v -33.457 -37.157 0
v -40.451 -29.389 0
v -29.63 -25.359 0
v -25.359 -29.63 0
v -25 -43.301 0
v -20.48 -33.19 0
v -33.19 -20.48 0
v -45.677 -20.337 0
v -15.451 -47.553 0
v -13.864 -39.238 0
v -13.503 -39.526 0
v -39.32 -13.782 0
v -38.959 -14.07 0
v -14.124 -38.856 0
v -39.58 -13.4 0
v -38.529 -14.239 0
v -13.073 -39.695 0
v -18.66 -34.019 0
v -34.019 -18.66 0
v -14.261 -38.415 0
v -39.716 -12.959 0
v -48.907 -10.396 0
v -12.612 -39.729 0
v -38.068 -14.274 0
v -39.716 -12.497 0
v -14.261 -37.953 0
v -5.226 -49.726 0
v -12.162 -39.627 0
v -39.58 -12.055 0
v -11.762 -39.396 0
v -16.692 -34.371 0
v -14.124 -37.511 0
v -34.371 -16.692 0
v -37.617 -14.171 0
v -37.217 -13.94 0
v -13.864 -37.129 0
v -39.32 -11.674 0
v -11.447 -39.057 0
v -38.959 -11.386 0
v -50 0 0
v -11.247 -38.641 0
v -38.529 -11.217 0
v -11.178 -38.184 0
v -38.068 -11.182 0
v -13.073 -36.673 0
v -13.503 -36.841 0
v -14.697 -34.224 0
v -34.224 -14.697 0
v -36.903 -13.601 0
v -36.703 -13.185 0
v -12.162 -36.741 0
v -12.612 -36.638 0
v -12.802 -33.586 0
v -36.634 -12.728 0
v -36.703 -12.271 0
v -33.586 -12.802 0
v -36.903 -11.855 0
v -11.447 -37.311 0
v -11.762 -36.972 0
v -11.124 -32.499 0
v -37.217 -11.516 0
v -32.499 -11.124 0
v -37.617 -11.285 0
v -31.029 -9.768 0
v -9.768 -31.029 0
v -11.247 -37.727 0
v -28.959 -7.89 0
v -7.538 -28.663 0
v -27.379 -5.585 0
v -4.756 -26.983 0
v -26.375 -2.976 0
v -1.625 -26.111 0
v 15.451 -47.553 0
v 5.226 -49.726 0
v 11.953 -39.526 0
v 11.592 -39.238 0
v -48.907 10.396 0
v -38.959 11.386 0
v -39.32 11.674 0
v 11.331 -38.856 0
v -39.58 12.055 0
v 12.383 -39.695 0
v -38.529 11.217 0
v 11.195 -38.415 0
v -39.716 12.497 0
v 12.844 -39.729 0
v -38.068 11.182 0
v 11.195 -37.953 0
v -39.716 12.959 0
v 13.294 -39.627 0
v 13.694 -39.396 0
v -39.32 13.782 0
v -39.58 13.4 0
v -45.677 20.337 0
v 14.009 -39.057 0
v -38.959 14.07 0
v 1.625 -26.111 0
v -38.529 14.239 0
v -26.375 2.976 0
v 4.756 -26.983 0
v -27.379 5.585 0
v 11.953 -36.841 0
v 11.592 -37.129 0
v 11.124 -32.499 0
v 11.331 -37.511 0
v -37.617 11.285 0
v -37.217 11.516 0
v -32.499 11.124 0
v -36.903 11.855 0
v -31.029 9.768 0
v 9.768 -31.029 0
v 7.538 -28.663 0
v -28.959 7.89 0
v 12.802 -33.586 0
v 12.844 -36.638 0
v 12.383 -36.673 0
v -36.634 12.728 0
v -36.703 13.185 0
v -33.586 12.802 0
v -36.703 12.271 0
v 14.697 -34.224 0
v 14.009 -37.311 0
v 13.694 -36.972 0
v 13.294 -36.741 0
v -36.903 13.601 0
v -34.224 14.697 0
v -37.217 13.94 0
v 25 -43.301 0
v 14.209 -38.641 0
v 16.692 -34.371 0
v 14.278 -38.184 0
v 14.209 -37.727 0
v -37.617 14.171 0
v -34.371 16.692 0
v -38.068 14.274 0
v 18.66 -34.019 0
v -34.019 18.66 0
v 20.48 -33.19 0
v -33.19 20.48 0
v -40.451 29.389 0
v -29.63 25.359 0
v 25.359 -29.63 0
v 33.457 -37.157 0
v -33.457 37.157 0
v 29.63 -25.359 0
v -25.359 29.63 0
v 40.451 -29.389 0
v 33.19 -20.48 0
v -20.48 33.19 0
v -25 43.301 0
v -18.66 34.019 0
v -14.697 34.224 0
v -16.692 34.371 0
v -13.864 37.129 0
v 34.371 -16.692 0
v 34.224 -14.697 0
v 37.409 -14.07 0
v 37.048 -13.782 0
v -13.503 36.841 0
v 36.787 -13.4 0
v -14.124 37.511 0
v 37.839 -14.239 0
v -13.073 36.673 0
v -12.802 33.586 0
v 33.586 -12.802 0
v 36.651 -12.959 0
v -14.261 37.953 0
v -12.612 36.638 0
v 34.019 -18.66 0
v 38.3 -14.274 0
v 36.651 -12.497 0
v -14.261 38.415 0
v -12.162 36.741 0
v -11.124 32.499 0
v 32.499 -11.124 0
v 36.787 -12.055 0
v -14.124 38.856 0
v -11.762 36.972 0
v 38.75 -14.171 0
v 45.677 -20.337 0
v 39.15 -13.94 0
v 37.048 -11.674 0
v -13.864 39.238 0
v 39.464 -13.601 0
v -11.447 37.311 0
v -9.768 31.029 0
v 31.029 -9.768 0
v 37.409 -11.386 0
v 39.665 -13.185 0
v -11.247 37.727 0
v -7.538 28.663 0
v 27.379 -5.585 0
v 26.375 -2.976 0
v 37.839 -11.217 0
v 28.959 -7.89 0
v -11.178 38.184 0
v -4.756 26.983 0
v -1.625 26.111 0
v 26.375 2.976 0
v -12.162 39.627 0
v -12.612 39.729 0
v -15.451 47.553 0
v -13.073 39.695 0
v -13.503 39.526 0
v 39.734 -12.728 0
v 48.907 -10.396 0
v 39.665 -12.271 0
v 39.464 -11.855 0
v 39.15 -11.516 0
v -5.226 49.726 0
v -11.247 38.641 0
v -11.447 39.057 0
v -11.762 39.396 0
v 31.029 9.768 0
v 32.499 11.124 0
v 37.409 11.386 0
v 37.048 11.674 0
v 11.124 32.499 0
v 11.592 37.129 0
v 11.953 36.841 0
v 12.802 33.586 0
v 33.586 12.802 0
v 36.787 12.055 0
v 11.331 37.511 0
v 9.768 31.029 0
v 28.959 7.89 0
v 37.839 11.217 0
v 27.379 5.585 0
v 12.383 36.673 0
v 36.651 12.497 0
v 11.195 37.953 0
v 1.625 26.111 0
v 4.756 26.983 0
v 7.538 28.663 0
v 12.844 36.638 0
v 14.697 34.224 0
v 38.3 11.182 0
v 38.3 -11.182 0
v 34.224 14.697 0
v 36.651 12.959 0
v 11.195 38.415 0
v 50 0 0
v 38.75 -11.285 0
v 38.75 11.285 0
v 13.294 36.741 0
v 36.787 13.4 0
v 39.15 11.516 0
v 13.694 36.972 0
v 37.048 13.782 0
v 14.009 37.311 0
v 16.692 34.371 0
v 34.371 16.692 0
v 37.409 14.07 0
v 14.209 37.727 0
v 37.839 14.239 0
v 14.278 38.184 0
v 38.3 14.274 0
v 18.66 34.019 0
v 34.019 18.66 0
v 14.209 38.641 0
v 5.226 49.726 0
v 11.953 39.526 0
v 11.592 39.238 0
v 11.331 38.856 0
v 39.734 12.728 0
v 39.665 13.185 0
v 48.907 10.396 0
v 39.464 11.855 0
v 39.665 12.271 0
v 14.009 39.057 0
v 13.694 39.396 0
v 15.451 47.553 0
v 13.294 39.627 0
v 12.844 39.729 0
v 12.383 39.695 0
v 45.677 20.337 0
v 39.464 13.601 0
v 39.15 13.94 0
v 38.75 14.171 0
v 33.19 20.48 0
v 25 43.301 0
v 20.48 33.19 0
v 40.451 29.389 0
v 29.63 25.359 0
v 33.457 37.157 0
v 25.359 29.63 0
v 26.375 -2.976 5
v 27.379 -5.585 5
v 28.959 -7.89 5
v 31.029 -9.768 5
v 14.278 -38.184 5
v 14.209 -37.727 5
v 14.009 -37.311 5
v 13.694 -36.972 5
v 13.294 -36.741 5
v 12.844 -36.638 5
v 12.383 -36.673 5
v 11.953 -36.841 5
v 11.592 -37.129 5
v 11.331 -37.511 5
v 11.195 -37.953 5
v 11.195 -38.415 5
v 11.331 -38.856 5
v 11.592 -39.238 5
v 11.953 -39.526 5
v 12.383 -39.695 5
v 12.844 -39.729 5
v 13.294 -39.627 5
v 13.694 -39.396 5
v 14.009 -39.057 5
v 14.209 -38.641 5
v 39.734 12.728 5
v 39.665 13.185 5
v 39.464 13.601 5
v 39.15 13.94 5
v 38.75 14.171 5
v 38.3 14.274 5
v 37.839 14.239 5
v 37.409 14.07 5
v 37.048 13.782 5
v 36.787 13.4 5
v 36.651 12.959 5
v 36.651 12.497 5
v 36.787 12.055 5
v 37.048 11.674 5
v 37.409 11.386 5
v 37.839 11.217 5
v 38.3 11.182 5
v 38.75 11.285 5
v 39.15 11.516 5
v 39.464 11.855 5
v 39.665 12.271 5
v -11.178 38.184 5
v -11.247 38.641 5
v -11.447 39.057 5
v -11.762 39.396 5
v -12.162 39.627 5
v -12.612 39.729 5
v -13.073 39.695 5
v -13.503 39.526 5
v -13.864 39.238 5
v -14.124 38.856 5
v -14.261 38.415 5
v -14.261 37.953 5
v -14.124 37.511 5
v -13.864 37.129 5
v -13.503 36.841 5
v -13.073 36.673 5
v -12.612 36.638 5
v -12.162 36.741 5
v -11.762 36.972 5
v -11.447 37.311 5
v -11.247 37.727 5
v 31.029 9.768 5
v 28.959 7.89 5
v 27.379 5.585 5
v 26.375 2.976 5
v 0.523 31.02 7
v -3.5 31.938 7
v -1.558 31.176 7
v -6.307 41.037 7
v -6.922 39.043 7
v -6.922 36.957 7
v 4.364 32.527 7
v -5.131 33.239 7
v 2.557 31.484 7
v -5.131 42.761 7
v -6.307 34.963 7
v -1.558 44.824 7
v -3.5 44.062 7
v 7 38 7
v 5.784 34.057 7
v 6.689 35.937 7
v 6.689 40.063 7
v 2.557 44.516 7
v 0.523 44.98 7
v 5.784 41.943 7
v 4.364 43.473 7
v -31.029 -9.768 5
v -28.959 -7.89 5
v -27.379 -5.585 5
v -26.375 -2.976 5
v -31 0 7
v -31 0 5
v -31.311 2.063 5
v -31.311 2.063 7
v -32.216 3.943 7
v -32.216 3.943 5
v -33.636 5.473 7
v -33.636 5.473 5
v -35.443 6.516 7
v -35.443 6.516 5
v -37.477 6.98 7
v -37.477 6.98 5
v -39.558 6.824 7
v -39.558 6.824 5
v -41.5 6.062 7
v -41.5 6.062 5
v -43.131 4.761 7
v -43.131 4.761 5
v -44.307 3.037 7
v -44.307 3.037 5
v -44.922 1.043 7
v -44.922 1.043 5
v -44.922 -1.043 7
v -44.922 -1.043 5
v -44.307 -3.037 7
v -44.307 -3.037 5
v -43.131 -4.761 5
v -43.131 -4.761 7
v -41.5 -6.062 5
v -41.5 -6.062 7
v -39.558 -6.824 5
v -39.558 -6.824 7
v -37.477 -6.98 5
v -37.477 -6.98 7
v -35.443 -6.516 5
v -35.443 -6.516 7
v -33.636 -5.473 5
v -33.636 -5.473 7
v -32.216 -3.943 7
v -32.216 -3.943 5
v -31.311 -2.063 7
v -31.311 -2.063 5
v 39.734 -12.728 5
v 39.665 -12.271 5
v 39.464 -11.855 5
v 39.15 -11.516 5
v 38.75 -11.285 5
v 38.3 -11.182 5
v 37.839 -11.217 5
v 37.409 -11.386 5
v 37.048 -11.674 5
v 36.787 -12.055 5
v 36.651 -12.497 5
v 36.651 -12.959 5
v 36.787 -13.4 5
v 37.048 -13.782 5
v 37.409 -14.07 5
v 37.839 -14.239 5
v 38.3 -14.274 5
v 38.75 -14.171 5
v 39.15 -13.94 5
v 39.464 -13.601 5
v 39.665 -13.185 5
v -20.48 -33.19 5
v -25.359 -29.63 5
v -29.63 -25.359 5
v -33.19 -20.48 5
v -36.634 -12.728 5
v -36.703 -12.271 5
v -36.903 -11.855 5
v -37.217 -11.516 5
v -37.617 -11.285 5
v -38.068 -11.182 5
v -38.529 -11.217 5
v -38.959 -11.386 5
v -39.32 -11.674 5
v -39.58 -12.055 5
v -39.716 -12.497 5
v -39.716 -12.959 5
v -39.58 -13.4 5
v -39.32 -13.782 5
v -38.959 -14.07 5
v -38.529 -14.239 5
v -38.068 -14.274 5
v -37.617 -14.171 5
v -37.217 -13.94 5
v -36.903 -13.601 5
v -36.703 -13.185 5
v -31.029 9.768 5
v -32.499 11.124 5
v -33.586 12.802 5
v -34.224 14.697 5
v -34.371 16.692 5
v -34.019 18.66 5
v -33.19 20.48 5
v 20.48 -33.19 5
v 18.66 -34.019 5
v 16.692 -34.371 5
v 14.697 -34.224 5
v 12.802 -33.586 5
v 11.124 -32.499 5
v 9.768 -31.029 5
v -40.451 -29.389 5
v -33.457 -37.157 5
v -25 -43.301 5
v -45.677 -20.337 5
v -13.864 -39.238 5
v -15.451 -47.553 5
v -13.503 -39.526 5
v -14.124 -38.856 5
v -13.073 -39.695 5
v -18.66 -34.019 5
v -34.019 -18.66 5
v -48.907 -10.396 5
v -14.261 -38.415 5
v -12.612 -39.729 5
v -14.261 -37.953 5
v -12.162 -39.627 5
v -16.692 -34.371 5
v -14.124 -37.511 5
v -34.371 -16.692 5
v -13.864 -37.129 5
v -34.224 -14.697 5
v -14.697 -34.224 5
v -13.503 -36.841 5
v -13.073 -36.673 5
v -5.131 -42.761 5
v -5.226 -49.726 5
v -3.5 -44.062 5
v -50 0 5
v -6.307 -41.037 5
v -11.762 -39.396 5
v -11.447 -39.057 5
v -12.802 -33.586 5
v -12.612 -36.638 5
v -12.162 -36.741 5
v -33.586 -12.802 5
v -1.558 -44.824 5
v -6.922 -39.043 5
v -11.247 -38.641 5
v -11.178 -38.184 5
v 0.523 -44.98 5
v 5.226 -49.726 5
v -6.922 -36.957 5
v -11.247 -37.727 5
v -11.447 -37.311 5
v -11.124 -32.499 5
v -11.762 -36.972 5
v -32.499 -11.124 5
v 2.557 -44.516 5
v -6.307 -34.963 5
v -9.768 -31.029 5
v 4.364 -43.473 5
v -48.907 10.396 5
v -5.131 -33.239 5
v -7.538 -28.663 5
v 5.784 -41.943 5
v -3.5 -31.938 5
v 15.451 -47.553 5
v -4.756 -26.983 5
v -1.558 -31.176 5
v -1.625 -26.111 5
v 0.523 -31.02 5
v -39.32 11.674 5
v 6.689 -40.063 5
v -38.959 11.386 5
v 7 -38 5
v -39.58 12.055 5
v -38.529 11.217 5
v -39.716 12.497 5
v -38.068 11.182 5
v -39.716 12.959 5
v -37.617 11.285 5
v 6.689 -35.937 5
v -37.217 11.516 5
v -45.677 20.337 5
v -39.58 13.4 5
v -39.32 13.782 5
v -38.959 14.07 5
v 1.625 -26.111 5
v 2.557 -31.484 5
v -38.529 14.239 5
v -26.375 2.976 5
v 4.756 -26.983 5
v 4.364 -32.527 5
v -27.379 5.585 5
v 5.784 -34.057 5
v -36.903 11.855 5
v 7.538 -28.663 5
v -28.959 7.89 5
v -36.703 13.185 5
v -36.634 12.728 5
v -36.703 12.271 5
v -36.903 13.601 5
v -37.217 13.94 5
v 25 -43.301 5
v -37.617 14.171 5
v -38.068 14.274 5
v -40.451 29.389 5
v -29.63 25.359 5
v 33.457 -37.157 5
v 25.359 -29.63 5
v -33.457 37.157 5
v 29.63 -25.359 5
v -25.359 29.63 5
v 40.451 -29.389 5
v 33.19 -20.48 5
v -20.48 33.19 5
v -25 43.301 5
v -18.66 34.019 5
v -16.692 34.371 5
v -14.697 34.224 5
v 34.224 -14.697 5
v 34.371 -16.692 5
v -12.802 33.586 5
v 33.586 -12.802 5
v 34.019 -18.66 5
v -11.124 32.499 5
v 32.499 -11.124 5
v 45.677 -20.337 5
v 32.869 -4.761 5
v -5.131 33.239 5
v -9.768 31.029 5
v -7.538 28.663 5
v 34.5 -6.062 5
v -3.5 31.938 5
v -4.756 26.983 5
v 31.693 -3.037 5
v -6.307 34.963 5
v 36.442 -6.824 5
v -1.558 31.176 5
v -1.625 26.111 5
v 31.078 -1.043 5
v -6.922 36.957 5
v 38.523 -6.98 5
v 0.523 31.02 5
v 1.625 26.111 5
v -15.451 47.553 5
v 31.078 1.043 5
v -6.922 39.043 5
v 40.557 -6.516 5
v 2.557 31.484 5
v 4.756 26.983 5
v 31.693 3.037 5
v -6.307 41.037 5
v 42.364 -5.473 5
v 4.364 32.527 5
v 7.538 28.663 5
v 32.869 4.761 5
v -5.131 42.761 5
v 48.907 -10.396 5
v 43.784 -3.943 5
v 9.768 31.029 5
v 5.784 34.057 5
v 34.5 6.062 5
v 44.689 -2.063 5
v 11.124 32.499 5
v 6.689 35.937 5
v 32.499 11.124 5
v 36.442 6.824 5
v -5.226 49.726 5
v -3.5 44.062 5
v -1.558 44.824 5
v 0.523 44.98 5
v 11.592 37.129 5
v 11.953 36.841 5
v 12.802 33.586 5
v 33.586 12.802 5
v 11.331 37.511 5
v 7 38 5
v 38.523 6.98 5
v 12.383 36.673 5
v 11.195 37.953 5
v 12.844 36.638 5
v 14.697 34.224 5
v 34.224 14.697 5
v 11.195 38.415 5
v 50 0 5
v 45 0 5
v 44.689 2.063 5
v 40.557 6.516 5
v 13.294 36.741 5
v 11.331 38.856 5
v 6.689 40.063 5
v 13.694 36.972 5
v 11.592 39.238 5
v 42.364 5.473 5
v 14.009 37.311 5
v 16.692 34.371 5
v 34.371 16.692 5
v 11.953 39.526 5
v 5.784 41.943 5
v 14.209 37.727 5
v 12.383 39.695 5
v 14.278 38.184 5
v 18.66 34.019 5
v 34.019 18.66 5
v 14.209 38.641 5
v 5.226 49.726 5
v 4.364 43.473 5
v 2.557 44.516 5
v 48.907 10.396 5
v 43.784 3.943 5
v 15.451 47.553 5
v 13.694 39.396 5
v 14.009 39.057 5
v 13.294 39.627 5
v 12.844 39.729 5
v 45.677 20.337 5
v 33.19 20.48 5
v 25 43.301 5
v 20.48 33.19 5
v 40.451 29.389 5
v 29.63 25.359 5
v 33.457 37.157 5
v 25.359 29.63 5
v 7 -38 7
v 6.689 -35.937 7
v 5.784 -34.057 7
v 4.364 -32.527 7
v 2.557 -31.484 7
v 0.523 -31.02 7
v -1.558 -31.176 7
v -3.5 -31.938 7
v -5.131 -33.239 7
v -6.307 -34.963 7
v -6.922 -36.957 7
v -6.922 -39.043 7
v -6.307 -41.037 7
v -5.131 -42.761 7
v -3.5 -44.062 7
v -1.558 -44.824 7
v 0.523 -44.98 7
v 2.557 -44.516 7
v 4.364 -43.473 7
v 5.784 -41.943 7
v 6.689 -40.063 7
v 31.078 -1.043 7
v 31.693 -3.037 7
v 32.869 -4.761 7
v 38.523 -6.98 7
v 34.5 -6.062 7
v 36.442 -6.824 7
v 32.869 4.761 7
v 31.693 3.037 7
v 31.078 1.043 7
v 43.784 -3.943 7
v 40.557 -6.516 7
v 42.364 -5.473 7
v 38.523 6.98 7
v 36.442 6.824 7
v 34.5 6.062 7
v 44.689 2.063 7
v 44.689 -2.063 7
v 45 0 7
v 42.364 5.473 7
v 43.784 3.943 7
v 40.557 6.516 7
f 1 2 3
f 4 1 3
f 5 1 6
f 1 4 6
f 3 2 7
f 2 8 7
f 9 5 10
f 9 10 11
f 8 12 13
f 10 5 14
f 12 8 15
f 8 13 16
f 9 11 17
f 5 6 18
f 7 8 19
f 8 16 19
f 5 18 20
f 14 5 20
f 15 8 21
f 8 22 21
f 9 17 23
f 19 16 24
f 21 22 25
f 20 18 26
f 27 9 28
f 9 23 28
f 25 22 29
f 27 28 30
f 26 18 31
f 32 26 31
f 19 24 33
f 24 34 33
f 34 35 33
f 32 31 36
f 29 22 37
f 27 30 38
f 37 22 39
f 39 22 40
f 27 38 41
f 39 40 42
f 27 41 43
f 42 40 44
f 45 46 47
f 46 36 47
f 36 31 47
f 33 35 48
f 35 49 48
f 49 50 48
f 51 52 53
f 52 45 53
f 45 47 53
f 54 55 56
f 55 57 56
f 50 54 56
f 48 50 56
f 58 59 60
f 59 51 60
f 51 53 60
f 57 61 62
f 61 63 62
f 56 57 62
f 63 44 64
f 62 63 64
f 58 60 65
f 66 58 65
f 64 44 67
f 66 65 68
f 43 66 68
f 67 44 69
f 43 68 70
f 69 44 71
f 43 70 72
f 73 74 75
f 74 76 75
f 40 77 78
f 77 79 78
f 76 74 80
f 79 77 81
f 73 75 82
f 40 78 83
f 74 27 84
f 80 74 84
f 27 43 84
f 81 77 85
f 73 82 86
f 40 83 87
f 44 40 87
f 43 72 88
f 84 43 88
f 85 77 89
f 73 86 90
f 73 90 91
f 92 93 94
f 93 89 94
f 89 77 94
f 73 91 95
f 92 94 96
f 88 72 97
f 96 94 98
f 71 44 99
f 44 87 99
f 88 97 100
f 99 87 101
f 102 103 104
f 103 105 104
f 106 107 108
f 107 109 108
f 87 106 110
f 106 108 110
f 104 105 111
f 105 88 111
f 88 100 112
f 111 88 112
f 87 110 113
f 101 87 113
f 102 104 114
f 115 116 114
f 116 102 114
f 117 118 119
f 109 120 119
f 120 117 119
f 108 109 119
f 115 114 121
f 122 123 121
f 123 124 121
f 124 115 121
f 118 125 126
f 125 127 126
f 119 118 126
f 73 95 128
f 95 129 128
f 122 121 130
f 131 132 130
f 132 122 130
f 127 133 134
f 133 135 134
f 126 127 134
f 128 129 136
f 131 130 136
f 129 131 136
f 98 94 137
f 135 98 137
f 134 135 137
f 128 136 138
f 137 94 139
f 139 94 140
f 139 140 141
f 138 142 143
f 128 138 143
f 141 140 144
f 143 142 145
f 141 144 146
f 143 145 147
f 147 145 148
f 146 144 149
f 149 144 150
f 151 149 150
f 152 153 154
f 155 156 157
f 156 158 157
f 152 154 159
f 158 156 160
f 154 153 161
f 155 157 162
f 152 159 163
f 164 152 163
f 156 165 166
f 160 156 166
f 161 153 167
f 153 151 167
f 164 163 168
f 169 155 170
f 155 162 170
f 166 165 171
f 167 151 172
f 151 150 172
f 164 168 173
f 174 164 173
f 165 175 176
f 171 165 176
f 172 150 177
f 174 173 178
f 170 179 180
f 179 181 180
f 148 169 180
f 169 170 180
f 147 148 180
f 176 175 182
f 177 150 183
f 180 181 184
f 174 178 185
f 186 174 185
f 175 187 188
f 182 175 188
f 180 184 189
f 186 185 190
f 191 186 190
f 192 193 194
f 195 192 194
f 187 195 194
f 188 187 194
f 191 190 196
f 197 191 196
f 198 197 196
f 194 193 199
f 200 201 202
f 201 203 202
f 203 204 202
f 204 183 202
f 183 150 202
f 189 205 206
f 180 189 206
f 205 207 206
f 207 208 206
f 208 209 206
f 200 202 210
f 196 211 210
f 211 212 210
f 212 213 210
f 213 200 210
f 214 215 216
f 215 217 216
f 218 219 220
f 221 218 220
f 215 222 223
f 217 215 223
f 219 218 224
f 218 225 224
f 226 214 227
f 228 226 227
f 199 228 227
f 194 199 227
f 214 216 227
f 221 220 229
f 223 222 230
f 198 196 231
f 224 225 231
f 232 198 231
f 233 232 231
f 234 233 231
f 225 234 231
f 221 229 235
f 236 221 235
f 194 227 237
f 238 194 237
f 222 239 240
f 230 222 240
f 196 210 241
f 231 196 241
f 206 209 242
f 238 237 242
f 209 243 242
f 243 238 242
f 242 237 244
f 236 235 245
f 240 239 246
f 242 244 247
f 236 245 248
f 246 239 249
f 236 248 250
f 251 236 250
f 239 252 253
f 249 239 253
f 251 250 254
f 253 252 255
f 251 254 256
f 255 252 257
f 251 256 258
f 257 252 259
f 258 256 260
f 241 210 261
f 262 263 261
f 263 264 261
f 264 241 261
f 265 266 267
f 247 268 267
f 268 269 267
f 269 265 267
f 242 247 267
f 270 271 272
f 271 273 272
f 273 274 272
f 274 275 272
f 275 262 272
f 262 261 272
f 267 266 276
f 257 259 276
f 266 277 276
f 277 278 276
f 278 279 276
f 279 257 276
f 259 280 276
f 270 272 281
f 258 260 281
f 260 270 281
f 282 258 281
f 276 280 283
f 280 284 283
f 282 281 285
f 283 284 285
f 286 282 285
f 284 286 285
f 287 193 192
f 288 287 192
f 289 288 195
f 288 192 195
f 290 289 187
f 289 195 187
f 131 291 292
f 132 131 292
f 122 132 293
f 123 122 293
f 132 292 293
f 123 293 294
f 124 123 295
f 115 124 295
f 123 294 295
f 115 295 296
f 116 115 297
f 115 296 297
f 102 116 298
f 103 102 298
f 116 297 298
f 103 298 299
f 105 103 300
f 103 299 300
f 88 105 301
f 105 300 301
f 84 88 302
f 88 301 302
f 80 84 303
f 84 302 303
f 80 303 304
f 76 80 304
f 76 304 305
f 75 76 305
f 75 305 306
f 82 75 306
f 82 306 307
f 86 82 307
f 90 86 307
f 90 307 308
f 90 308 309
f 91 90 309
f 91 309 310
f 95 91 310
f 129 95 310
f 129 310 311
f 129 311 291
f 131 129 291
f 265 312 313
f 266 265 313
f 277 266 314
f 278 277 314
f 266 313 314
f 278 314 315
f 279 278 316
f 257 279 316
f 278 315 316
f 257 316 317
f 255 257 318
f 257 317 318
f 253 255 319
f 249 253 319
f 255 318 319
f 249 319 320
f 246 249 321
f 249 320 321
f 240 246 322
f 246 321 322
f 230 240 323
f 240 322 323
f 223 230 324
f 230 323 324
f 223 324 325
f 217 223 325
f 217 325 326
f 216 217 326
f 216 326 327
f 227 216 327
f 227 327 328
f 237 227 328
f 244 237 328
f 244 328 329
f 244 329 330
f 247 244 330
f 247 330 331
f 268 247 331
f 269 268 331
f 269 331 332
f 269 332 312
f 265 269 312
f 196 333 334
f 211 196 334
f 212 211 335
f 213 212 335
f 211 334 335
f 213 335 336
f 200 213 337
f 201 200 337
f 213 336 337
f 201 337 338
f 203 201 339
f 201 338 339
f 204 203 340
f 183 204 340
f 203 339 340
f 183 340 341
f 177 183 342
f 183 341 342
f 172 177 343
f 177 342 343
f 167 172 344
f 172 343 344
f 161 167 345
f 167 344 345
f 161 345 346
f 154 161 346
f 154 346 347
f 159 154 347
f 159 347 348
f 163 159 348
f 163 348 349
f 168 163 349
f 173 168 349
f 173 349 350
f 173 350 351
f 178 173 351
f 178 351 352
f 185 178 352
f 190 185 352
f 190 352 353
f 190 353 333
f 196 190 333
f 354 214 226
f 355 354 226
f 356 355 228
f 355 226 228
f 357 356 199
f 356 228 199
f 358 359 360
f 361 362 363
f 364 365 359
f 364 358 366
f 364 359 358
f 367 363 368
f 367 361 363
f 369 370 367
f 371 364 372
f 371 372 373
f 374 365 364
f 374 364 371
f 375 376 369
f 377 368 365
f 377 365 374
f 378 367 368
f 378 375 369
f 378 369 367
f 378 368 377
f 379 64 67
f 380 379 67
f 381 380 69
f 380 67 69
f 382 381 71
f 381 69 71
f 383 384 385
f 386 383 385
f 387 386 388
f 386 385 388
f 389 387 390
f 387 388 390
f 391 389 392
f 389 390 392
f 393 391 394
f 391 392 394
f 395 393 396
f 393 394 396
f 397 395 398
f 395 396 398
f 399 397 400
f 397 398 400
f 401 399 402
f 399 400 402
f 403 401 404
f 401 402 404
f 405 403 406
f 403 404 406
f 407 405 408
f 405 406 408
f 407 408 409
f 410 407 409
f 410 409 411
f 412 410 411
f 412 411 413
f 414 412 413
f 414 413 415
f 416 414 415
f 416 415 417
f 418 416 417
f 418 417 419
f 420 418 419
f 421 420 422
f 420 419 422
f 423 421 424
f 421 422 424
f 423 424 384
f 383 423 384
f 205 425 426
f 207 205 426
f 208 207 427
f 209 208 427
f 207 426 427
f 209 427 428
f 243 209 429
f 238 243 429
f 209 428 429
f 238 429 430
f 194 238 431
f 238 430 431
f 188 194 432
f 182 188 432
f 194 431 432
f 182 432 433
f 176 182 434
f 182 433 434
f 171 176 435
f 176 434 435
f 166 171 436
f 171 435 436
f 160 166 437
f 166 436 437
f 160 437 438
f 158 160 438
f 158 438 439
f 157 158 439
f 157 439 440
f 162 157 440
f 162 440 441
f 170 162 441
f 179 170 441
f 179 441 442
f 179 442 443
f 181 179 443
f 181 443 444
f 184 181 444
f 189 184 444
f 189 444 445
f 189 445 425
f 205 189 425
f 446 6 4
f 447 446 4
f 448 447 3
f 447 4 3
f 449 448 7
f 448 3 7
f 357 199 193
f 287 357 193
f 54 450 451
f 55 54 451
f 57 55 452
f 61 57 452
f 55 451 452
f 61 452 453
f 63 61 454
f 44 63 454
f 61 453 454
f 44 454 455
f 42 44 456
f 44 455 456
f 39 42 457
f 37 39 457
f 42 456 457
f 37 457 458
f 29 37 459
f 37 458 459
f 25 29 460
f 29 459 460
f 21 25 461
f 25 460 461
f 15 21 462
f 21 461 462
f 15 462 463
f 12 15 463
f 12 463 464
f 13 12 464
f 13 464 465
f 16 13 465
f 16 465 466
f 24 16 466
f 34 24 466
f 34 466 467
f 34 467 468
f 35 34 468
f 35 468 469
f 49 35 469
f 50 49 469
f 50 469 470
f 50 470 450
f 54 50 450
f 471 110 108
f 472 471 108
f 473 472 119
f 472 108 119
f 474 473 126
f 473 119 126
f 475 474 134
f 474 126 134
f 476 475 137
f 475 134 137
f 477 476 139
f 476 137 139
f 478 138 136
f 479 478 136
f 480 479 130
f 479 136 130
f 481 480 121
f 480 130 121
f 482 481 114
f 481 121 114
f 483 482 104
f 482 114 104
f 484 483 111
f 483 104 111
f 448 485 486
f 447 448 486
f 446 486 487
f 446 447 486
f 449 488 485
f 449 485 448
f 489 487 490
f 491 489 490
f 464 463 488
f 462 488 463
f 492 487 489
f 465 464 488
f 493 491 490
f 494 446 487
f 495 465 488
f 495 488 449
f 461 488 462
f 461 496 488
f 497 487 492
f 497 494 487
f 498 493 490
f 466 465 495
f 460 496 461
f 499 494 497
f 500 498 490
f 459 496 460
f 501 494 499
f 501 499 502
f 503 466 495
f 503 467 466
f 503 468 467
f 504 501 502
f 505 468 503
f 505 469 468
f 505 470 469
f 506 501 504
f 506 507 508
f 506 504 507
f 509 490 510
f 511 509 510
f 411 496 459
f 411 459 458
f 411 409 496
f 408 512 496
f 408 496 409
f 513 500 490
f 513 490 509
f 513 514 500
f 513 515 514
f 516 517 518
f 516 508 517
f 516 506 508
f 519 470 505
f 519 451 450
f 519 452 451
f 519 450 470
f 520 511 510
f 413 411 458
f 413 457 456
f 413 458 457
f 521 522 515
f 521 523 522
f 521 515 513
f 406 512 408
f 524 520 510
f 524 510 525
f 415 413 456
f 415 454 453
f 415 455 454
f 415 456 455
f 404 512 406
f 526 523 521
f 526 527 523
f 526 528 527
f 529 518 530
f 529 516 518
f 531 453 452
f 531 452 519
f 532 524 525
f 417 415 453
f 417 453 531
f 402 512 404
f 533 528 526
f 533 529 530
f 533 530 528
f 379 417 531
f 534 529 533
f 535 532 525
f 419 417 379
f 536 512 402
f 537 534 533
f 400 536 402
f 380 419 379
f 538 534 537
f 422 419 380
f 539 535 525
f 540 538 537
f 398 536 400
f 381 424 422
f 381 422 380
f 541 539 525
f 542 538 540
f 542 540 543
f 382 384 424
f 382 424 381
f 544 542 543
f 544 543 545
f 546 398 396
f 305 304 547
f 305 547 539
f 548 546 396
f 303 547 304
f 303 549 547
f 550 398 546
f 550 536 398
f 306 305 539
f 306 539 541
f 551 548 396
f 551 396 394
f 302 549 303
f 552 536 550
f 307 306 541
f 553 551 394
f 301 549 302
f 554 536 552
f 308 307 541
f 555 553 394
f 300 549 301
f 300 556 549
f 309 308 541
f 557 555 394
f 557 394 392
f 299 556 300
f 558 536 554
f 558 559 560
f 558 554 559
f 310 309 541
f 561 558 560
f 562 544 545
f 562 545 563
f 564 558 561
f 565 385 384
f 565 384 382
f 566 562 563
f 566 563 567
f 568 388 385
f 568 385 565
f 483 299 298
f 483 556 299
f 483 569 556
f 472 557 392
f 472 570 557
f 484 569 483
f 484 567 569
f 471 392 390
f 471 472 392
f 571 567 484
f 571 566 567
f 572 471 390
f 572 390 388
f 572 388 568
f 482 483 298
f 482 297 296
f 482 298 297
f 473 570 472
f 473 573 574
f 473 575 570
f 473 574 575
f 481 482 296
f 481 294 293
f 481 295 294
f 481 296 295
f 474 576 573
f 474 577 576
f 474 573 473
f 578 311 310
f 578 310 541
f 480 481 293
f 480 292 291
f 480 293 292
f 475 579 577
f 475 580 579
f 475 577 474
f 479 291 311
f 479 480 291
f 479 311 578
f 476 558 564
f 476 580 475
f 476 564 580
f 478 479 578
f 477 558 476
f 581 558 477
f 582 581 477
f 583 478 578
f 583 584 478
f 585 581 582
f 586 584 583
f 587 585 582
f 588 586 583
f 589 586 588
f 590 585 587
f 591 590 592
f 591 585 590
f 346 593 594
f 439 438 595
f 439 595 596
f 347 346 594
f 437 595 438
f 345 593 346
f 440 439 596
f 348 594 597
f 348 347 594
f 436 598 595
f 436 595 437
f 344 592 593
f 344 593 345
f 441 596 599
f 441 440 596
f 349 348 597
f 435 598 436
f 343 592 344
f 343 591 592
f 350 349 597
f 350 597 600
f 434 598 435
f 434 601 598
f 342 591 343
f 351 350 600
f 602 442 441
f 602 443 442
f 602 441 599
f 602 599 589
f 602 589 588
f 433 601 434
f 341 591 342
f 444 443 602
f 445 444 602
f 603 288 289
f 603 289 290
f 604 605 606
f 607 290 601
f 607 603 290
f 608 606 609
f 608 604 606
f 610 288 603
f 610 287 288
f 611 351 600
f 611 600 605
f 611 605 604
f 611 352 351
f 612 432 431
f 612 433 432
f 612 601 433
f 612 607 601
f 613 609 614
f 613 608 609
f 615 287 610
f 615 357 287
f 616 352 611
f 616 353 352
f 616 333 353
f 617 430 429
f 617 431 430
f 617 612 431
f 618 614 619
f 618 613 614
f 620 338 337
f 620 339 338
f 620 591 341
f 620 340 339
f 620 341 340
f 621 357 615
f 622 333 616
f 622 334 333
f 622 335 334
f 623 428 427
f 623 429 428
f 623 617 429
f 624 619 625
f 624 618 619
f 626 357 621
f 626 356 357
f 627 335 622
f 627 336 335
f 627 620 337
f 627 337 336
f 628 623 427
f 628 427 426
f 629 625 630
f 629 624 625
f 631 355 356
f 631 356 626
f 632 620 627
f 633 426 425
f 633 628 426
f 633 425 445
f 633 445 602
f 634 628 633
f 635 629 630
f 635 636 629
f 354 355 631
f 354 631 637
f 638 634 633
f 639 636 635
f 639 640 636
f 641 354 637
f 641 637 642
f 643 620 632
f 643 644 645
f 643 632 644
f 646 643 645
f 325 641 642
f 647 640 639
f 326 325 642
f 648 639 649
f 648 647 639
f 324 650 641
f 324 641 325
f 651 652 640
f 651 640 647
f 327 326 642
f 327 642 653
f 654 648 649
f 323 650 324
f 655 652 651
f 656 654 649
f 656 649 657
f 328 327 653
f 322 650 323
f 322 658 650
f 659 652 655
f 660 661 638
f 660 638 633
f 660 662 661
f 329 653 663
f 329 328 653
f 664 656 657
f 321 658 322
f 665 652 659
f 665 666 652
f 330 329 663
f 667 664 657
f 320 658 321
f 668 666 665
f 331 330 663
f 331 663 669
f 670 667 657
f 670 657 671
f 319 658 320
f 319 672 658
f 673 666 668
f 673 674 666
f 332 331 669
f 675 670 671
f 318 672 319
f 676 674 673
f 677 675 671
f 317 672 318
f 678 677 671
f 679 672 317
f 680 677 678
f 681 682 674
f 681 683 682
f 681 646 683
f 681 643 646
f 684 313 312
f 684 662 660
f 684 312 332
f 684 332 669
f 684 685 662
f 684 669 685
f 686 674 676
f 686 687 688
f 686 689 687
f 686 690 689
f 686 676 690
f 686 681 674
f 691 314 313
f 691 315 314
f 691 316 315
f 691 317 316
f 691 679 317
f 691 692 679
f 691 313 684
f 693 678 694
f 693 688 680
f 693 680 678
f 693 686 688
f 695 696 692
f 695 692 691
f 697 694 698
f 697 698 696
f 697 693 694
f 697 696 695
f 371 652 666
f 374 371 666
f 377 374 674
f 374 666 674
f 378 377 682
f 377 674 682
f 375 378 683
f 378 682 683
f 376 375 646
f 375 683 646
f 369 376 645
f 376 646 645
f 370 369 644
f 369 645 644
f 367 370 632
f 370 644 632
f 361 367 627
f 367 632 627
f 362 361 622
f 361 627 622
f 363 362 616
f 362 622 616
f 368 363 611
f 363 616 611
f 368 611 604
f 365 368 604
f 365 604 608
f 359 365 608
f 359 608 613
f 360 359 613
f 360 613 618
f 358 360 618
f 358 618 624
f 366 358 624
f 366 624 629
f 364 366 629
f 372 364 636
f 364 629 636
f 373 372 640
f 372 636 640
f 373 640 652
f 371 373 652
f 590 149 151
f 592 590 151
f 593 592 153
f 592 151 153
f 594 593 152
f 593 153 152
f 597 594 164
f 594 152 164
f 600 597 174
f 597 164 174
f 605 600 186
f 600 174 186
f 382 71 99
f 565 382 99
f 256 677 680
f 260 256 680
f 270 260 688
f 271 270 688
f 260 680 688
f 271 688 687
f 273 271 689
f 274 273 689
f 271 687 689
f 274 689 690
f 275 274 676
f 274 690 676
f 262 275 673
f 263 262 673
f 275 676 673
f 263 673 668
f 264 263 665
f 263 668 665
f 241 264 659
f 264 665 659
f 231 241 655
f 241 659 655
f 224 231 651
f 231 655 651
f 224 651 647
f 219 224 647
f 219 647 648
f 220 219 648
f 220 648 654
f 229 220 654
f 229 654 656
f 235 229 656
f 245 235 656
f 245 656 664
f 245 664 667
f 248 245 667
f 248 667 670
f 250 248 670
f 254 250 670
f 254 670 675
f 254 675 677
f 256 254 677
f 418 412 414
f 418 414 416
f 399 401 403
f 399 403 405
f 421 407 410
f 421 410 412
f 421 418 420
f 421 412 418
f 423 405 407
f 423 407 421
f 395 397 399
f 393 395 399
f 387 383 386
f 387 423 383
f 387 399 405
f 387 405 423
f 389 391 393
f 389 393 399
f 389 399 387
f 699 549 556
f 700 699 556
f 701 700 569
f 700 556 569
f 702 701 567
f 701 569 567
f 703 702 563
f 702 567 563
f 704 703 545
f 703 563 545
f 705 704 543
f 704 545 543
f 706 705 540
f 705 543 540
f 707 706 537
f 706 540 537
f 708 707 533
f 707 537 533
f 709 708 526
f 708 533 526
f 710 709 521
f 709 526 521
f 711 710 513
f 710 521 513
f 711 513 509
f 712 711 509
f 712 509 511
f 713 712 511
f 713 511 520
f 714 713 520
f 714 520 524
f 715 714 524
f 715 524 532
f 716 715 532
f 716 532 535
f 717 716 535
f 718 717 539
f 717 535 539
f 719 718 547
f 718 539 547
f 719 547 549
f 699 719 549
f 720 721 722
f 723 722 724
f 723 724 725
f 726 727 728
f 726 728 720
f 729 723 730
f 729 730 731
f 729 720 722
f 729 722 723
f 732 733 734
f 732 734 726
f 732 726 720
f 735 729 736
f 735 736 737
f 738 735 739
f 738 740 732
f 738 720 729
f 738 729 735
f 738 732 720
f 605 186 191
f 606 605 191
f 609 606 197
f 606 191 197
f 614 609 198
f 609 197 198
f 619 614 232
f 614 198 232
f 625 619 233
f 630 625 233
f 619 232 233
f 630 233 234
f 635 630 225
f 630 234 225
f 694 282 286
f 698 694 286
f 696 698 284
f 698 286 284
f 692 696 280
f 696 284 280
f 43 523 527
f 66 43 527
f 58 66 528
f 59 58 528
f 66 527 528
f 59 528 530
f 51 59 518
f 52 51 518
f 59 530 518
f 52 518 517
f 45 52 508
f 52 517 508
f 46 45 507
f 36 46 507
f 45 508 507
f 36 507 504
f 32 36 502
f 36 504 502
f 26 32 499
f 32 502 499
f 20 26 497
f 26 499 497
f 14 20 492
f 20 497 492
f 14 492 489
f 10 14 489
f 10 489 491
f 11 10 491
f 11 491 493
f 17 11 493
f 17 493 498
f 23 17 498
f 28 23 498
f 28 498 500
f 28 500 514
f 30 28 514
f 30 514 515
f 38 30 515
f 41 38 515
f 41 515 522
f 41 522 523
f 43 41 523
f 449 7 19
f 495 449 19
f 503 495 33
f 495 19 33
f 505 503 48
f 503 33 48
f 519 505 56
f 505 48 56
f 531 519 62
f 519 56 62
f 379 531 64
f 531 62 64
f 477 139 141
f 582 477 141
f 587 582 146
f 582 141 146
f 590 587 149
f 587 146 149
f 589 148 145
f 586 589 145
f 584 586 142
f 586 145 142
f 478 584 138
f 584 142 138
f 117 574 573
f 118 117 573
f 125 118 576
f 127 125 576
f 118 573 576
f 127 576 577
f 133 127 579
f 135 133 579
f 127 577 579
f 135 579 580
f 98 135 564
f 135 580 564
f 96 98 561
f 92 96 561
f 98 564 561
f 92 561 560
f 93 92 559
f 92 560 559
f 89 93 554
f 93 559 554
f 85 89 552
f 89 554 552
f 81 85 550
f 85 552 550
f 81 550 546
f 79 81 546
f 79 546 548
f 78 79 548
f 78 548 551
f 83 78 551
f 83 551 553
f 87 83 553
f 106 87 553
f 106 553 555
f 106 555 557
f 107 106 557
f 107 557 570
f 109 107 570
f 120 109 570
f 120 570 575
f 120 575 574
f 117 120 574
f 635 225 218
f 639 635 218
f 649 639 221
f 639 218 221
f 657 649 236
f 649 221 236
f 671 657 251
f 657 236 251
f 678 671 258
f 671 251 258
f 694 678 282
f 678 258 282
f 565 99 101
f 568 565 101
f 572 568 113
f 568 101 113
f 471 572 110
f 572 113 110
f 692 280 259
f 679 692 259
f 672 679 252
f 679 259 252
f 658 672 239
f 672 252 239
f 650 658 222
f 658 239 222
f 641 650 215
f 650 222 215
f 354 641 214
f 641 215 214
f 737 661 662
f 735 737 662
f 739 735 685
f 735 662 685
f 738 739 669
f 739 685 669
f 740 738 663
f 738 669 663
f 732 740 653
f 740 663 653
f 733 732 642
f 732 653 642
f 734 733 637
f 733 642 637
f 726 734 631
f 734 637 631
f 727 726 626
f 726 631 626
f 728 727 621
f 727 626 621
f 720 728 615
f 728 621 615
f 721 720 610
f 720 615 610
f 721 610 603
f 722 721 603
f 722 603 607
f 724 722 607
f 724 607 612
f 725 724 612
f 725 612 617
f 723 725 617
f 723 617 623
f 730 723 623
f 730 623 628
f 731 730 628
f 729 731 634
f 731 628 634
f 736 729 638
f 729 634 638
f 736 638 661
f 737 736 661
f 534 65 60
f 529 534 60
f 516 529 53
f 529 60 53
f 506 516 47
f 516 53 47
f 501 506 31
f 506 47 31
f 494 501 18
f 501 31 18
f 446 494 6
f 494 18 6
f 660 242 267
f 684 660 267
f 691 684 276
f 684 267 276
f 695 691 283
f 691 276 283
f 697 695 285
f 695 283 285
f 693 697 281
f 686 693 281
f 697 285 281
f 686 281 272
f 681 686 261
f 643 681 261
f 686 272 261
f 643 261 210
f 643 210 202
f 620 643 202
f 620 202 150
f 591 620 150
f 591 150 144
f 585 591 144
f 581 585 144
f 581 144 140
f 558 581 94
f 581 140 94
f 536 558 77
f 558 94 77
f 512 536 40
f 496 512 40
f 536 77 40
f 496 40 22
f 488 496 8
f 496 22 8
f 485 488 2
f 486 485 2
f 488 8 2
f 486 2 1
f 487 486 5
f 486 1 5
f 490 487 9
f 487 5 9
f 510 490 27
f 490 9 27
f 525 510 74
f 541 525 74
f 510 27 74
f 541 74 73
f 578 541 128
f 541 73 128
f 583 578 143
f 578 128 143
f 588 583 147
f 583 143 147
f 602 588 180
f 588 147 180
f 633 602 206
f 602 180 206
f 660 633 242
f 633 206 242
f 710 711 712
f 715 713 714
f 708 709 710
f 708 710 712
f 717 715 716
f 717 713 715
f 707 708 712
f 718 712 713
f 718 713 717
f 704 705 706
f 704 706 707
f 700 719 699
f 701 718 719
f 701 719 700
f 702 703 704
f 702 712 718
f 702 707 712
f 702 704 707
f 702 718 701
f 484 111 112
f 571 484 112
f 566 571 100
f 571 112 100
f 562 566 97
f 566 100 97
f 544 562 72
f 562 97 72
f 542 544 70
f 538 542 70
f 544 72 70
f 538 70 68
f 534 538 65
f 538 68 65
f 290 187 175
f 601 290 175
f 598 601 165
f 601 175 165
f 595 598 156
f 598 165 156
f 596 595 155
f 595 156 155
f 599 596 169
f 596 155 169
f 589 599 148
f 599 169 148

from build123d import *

# Parameters (mm, degrees)
SKETCH1_R           = 50
BOSS_EXTRUDE1_DEPTH = 5
SKETCH2_R           = 7
BOSS_EXTRUDE2_DEPTH = 2
CUT_EXTRUDE1_REACH  = 7
SKETCH3_R           = 1.55


with BuildPart() as part:
    # Sketch1 → Boss-Extrude1 (new body)
    with BuildSketch(Plane.XY):
        Circle(SKETCH1_R)
        with BuildLine():
            ThreePointArc((-31.028947368, -9.767518887), (-28.10136985, -6.783592054), (-26.375, -2.976470225))
            Line((-26.375, -2.976470225), (-26.375, 2.976470225))
            ThreePointArc((-26.375, 2.976470225), (-28.10136985, 6.783592054), (-31.028947368, 9.767518887))
            ThreePointArc((-31.028947368, 9.767518887), (-34.223647748, 14.6974406), (-33.189728353, 20.480281537))
            ThreePointArc((-33.189728353, 20.480281537), (-27.577164466, 27.577164466), (-20.480281537, 33.189728353))
            ThreePointArc((-20.480281537, 33.189728353), (-14.6974406, 34.223647748), (-9.767518887, 31.028947368))
            ThreePointArc((-9.767518887, 31.028947368), (0, 26), (9.767518887, 31.028947368))
            ThreePointArc((9.767518887, 31.028947368), (14.6974406, 34.223647748), (20.480281537, 33.189728353))
            ThreePointArc((20.480281537, 33.189728353), (27.577164466, 27.577164466), (33.189728353, 20.480281537))
            ThreePointArc((33.189728353, 20.480281537), (34.223647748, 14.6974406), (31.028947368, 9.767518887))
            ThreePointArc((31.028947368, 9.767518887), (28.10136985, 6.783592054), (26.375, 2.976470225))
            Line((26.375, 2.976470225), (26.375, -2.976470225))
            ThreePointArc((26.375, -2.976470225), (28.10136985, -6.783592054), (31.028947368, -9.767518887))
            ThreePointArc((31.028947368, -9.767518887), (34.223647748, -14.6974406), (33.189728353, -20.480281537))
            ThreePointArc((33.189728353, -20.480281537), (27.577164466, -27.577164466), (20.480281537, -33.189728353))
            ThreePointArc((20.480281537, -33.189728353), (14.6974406, -34.223647748), (9.767518887, -31.028947368))
            ThreePointArc((9.767518887, -31.028947368), (0, -26), (-9.767518887, -31.028947368))
            ThreePointArc((-9.767518887, -31.028947368), (-14.6974406, -34.223647748), (-20.480281537, -33.189728353))
            ThreePointArc((-20.480281537, -33.189728353), (-27.577164466, -27.577164466), (-33.189728353, -20.480281537))
            ThreePointArc((-33.189728353, -20.480281537), (-34.223647748, -14.6974406), (-31.028947368, -9.767518887))
        make_face(mode=Mode.SUBTRACT)
    extrude(amount=BOSS_EXTRUDE1_DEPTH)

    # Sketch2 → Boss-Extrude2 (add)
    with BuildSketch(Plane.XY.offset(5)):
        with Locations((-38, 0)):
            Circle(SKETCH2_R)
        with Locations((0, 38)):
            Circle(SKETCH2_R)
        with Locations((38, 0)):
            Circle(SKETCH2_R)
        with Locations((0, -38)):
            Circle(SKETCH2_R)
    extrude(amount=BOSS_EXTRUDE2_DEPTH)

    # Sketch3 → Cut-Extrude1 (cut, up to next)
    with BuildSketch(Plane.XY.offset(5), mode=Mode.PRIVATE) as cut_extrude1_sk1:
        with Locations((-12.727922061, 38.183766184)):
            Circle(SKETCH3_R)
    cut_extrude1_tool1 = extrude(cut_extrude1_sk1.sketch, amount=-CUT_EXTRUDE1_REACH, mode=Mode.PRIVATE) & part.part
    add(cut_extrude1_tool1.solids().sort_by_distance((-12.727922, 38.183766, 5))[0], mode=Mode.SUBTRACT)
    # Sketch3 → Cut-Extrude1 (cut, up to next)
    with BuildSketch(Plane.XY.offset(5), mode=Mode.PRIVATE) as cut_extrude1_sk2:
        with Locations((38.183766184, 12.727922061)):
            Circle(SKETCH3_R)
    cut_extrude1_tool2 = extrude(cut_extrude1_sk2.sketch, amount=-CUT_EXTRUDE1_REACH, mode=Mode.PRIVATE) & part.part
    add(cut_extrude1_tool2.solids().sort_by_distance((38.183766, 12.727922, 5))[0], mode=Mode.SUBTRACT)
    # Sketch3 → Cut-Extrude1 (cut, up to next)
    with BuildSketch(Plane.XY.offset(5), mode=Mode.PRIVATE) as cut_extrude1_sk3:
        with Locations((12.727922061, -38.183766184)):
            Circle(SKETCH3_R)
    cut_extrude1_tool3 = extrude(cut_extrude1_sk3.sketch, amount=-CUT_EXTRUDE1_REACH, mode=Mode.PRIVATE) & part.part
    add(cut_extrude1_tool3.solids().sort_by_distance((12.727922, -38.183766, 5))[0], mode=Mode.SUBTRACT)
    # Sketch3 → Cut-Extrude1 (cut, up to next)
    with BuildSketch(Plane.XY.offset(5), mode=Mode.PRIVATE) as cut_extrude1_sk4:
        with Locations((-38.183766184, -12.727922061)):
            Circle(SKETCH3_R)
    cut_extrude1_tool4 = extrude(cut_extrude1_sk4.sketch, amount=-CUT_EXTRUDE1_REACH, mode=Mode.PRIVATE) & part.part
    add(cut_extrude1_tool4.solids().sort_by_distance((-38.183766, -12.727922, 5))[0], mode=Mode.SUBTRACT)
    # Sketch3 → Cut-Extrude1 (cut, up to next)
    with BuildSketch(Plane.XY.offset(5), mode=Mode.PRIVATE) as cut_extrude1_sk5:
        with Locations((-38.183766184, 12.727922061)):
            Circle(SKETCH3_R)
    cut_extrude1_tool5 = extrude(cut_extrude1_sk5.sketch, amount=-CUT_EXTRUDE1_REACH, mode=Mode.PRIVATE) & part.part
    add(cut_extrude1_tool5.solids().sort_by_distance((-38.183766, 12.727922, 5))[0], mode=Mode.SUBTRACT)
    # Sketch3 → Cut-Extrude1 (cut, up to next)
    with BuildSketch(Plane.XY.offset(5), mode=Mode.PRIVATE) as cut_extrude1_sk6:
        with Locations((12.727922061, 38.183766184)):
            Circle(SKETCH3_R)
    cut_extrude1_tool6 = extrude(cut_extrude1_sk6.sketch, amount=-CUT_EXTRUDE1_REACH, mode=Mode.PRIVATE) & part.part
    add(cut_extrude1_tool6.solids().sort_by_distance((12.727922, 38.183766, 5))[0], mode=Mode.SUBTRACT)
    # Sketch3 → Cut-Extrude1 (cut, up to next)
    with BuildSketch(Plane.XY.offset(5), mode=Mode.PRIVATE) as cut_extrude1_sk7:
        with Locations((38.183766184, -12.727922061)):
            Circle(SKETCH3_R)
    cut_extrude1_tool7 = extrude(cut_extrude1_sk7.sketch, amount=-CUT_EXTRUDE1_REACH, mode=Mode.PRIVATE) & part.part
    add(cut_extrude1_tool7.solids().sort_by_distance((38.183766, -12.727922, 5))[0], mode=Mode.SUBTRACT)
    # Sketch3 → Cut-Extrude1 (cut, up to next)
    with BuildSketch(Plane.XY.offset(5), mode=Mode.PRIVATE) as cut_extrude1_sk8:
        with Locations((-12.727922061, -38.183766184)):
            Circle(SKETCH3_R)
    cut_extrude1_tool8 = extrude(cut_extrude1_sk8.sketch, amount=-CUT_EXTRUDE1_REACH, mode=Mode.PRIVATE) & part.part
    add(cut_extrude1_tool8.solids().sort_by_distance((-12.727922, -38.183766, 5))[0], mode=Mode.SUBTRACT)


solid = part.part
